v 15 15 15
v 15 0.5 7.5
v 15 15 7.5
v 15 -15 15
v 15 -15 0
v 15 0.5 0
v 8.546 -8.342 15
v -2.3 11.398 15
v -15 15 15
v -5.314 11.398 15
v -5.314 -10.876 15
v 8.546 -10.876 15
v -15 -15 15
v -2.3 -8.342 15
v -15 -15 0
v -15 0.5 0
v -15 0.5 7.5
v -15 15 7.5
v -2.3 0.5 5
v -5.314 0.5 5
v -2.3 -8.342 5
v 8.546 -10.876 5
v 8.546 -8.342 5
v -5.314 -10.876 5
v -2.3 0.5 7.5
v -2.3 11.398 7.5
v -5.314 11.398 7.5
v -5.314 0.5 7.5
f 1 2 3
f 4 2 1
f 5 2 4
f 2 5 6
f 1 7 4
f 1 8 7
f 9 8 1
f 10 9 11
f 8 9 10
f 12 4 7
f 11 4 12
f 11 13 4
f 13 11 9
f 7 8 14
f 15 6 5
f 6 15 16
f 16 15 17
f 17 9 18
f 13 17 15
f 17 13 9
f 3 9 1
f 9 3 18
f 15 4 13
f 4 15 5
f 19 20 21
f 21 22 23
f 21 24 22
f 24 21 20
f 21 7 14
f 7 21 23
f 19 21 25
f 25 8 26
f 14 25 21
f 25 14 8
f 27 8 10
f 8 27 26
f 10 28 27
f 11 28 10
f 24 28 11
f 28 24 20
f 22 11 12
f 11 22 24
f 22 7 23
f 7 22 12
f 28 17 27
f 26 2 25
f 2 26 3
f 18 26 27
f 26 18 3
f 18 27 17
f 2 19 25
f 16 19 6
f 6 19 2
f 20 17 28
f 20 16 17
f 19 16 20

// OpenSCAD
// LetterBlock.scad - Basic usage of text() and linear_extrude()

// Module instantiation
LetterBlock("L");

// Module definition.
// size=30 defines an optional parameter with a default value.
module LetterBlock(letter, size=30) {
    difference() {
        difference() {
            translate([0,0,size/4]) cube([size,size,size/2], center=true);
            translate([0,0,size/6]) {
                // convexity is needed for correct preview
                // since characters can be highly concave
                linear_extrude(height=size, convexity=4)
                    text(letter, 
                         size=size*22/30,
                         font="Bitstream Vera Sans",
                         halign="center",
                         valign="center");
            }
        };
        {translate([0, size/4 + 1, 0]) color([0.1, 0.2, 1]) cube([size + 2, size/2 + 1, size/2], center=true);}
    }
}

echo(version=version());
// Written by Marius Kintel <marius@kintel.net>
//
// To the extent possible under law, the author(s) have dedicated all
// copyright and related and neighboring rights to this software to the
// public domain worldwide. This software is distributed without any
// warranty.
//
// You should have received a copy of the CC0 Public Domain
// Dedication along with this software.
// If not, see <http://creativecommons.org/publicdomain/zero/1.0/>.
